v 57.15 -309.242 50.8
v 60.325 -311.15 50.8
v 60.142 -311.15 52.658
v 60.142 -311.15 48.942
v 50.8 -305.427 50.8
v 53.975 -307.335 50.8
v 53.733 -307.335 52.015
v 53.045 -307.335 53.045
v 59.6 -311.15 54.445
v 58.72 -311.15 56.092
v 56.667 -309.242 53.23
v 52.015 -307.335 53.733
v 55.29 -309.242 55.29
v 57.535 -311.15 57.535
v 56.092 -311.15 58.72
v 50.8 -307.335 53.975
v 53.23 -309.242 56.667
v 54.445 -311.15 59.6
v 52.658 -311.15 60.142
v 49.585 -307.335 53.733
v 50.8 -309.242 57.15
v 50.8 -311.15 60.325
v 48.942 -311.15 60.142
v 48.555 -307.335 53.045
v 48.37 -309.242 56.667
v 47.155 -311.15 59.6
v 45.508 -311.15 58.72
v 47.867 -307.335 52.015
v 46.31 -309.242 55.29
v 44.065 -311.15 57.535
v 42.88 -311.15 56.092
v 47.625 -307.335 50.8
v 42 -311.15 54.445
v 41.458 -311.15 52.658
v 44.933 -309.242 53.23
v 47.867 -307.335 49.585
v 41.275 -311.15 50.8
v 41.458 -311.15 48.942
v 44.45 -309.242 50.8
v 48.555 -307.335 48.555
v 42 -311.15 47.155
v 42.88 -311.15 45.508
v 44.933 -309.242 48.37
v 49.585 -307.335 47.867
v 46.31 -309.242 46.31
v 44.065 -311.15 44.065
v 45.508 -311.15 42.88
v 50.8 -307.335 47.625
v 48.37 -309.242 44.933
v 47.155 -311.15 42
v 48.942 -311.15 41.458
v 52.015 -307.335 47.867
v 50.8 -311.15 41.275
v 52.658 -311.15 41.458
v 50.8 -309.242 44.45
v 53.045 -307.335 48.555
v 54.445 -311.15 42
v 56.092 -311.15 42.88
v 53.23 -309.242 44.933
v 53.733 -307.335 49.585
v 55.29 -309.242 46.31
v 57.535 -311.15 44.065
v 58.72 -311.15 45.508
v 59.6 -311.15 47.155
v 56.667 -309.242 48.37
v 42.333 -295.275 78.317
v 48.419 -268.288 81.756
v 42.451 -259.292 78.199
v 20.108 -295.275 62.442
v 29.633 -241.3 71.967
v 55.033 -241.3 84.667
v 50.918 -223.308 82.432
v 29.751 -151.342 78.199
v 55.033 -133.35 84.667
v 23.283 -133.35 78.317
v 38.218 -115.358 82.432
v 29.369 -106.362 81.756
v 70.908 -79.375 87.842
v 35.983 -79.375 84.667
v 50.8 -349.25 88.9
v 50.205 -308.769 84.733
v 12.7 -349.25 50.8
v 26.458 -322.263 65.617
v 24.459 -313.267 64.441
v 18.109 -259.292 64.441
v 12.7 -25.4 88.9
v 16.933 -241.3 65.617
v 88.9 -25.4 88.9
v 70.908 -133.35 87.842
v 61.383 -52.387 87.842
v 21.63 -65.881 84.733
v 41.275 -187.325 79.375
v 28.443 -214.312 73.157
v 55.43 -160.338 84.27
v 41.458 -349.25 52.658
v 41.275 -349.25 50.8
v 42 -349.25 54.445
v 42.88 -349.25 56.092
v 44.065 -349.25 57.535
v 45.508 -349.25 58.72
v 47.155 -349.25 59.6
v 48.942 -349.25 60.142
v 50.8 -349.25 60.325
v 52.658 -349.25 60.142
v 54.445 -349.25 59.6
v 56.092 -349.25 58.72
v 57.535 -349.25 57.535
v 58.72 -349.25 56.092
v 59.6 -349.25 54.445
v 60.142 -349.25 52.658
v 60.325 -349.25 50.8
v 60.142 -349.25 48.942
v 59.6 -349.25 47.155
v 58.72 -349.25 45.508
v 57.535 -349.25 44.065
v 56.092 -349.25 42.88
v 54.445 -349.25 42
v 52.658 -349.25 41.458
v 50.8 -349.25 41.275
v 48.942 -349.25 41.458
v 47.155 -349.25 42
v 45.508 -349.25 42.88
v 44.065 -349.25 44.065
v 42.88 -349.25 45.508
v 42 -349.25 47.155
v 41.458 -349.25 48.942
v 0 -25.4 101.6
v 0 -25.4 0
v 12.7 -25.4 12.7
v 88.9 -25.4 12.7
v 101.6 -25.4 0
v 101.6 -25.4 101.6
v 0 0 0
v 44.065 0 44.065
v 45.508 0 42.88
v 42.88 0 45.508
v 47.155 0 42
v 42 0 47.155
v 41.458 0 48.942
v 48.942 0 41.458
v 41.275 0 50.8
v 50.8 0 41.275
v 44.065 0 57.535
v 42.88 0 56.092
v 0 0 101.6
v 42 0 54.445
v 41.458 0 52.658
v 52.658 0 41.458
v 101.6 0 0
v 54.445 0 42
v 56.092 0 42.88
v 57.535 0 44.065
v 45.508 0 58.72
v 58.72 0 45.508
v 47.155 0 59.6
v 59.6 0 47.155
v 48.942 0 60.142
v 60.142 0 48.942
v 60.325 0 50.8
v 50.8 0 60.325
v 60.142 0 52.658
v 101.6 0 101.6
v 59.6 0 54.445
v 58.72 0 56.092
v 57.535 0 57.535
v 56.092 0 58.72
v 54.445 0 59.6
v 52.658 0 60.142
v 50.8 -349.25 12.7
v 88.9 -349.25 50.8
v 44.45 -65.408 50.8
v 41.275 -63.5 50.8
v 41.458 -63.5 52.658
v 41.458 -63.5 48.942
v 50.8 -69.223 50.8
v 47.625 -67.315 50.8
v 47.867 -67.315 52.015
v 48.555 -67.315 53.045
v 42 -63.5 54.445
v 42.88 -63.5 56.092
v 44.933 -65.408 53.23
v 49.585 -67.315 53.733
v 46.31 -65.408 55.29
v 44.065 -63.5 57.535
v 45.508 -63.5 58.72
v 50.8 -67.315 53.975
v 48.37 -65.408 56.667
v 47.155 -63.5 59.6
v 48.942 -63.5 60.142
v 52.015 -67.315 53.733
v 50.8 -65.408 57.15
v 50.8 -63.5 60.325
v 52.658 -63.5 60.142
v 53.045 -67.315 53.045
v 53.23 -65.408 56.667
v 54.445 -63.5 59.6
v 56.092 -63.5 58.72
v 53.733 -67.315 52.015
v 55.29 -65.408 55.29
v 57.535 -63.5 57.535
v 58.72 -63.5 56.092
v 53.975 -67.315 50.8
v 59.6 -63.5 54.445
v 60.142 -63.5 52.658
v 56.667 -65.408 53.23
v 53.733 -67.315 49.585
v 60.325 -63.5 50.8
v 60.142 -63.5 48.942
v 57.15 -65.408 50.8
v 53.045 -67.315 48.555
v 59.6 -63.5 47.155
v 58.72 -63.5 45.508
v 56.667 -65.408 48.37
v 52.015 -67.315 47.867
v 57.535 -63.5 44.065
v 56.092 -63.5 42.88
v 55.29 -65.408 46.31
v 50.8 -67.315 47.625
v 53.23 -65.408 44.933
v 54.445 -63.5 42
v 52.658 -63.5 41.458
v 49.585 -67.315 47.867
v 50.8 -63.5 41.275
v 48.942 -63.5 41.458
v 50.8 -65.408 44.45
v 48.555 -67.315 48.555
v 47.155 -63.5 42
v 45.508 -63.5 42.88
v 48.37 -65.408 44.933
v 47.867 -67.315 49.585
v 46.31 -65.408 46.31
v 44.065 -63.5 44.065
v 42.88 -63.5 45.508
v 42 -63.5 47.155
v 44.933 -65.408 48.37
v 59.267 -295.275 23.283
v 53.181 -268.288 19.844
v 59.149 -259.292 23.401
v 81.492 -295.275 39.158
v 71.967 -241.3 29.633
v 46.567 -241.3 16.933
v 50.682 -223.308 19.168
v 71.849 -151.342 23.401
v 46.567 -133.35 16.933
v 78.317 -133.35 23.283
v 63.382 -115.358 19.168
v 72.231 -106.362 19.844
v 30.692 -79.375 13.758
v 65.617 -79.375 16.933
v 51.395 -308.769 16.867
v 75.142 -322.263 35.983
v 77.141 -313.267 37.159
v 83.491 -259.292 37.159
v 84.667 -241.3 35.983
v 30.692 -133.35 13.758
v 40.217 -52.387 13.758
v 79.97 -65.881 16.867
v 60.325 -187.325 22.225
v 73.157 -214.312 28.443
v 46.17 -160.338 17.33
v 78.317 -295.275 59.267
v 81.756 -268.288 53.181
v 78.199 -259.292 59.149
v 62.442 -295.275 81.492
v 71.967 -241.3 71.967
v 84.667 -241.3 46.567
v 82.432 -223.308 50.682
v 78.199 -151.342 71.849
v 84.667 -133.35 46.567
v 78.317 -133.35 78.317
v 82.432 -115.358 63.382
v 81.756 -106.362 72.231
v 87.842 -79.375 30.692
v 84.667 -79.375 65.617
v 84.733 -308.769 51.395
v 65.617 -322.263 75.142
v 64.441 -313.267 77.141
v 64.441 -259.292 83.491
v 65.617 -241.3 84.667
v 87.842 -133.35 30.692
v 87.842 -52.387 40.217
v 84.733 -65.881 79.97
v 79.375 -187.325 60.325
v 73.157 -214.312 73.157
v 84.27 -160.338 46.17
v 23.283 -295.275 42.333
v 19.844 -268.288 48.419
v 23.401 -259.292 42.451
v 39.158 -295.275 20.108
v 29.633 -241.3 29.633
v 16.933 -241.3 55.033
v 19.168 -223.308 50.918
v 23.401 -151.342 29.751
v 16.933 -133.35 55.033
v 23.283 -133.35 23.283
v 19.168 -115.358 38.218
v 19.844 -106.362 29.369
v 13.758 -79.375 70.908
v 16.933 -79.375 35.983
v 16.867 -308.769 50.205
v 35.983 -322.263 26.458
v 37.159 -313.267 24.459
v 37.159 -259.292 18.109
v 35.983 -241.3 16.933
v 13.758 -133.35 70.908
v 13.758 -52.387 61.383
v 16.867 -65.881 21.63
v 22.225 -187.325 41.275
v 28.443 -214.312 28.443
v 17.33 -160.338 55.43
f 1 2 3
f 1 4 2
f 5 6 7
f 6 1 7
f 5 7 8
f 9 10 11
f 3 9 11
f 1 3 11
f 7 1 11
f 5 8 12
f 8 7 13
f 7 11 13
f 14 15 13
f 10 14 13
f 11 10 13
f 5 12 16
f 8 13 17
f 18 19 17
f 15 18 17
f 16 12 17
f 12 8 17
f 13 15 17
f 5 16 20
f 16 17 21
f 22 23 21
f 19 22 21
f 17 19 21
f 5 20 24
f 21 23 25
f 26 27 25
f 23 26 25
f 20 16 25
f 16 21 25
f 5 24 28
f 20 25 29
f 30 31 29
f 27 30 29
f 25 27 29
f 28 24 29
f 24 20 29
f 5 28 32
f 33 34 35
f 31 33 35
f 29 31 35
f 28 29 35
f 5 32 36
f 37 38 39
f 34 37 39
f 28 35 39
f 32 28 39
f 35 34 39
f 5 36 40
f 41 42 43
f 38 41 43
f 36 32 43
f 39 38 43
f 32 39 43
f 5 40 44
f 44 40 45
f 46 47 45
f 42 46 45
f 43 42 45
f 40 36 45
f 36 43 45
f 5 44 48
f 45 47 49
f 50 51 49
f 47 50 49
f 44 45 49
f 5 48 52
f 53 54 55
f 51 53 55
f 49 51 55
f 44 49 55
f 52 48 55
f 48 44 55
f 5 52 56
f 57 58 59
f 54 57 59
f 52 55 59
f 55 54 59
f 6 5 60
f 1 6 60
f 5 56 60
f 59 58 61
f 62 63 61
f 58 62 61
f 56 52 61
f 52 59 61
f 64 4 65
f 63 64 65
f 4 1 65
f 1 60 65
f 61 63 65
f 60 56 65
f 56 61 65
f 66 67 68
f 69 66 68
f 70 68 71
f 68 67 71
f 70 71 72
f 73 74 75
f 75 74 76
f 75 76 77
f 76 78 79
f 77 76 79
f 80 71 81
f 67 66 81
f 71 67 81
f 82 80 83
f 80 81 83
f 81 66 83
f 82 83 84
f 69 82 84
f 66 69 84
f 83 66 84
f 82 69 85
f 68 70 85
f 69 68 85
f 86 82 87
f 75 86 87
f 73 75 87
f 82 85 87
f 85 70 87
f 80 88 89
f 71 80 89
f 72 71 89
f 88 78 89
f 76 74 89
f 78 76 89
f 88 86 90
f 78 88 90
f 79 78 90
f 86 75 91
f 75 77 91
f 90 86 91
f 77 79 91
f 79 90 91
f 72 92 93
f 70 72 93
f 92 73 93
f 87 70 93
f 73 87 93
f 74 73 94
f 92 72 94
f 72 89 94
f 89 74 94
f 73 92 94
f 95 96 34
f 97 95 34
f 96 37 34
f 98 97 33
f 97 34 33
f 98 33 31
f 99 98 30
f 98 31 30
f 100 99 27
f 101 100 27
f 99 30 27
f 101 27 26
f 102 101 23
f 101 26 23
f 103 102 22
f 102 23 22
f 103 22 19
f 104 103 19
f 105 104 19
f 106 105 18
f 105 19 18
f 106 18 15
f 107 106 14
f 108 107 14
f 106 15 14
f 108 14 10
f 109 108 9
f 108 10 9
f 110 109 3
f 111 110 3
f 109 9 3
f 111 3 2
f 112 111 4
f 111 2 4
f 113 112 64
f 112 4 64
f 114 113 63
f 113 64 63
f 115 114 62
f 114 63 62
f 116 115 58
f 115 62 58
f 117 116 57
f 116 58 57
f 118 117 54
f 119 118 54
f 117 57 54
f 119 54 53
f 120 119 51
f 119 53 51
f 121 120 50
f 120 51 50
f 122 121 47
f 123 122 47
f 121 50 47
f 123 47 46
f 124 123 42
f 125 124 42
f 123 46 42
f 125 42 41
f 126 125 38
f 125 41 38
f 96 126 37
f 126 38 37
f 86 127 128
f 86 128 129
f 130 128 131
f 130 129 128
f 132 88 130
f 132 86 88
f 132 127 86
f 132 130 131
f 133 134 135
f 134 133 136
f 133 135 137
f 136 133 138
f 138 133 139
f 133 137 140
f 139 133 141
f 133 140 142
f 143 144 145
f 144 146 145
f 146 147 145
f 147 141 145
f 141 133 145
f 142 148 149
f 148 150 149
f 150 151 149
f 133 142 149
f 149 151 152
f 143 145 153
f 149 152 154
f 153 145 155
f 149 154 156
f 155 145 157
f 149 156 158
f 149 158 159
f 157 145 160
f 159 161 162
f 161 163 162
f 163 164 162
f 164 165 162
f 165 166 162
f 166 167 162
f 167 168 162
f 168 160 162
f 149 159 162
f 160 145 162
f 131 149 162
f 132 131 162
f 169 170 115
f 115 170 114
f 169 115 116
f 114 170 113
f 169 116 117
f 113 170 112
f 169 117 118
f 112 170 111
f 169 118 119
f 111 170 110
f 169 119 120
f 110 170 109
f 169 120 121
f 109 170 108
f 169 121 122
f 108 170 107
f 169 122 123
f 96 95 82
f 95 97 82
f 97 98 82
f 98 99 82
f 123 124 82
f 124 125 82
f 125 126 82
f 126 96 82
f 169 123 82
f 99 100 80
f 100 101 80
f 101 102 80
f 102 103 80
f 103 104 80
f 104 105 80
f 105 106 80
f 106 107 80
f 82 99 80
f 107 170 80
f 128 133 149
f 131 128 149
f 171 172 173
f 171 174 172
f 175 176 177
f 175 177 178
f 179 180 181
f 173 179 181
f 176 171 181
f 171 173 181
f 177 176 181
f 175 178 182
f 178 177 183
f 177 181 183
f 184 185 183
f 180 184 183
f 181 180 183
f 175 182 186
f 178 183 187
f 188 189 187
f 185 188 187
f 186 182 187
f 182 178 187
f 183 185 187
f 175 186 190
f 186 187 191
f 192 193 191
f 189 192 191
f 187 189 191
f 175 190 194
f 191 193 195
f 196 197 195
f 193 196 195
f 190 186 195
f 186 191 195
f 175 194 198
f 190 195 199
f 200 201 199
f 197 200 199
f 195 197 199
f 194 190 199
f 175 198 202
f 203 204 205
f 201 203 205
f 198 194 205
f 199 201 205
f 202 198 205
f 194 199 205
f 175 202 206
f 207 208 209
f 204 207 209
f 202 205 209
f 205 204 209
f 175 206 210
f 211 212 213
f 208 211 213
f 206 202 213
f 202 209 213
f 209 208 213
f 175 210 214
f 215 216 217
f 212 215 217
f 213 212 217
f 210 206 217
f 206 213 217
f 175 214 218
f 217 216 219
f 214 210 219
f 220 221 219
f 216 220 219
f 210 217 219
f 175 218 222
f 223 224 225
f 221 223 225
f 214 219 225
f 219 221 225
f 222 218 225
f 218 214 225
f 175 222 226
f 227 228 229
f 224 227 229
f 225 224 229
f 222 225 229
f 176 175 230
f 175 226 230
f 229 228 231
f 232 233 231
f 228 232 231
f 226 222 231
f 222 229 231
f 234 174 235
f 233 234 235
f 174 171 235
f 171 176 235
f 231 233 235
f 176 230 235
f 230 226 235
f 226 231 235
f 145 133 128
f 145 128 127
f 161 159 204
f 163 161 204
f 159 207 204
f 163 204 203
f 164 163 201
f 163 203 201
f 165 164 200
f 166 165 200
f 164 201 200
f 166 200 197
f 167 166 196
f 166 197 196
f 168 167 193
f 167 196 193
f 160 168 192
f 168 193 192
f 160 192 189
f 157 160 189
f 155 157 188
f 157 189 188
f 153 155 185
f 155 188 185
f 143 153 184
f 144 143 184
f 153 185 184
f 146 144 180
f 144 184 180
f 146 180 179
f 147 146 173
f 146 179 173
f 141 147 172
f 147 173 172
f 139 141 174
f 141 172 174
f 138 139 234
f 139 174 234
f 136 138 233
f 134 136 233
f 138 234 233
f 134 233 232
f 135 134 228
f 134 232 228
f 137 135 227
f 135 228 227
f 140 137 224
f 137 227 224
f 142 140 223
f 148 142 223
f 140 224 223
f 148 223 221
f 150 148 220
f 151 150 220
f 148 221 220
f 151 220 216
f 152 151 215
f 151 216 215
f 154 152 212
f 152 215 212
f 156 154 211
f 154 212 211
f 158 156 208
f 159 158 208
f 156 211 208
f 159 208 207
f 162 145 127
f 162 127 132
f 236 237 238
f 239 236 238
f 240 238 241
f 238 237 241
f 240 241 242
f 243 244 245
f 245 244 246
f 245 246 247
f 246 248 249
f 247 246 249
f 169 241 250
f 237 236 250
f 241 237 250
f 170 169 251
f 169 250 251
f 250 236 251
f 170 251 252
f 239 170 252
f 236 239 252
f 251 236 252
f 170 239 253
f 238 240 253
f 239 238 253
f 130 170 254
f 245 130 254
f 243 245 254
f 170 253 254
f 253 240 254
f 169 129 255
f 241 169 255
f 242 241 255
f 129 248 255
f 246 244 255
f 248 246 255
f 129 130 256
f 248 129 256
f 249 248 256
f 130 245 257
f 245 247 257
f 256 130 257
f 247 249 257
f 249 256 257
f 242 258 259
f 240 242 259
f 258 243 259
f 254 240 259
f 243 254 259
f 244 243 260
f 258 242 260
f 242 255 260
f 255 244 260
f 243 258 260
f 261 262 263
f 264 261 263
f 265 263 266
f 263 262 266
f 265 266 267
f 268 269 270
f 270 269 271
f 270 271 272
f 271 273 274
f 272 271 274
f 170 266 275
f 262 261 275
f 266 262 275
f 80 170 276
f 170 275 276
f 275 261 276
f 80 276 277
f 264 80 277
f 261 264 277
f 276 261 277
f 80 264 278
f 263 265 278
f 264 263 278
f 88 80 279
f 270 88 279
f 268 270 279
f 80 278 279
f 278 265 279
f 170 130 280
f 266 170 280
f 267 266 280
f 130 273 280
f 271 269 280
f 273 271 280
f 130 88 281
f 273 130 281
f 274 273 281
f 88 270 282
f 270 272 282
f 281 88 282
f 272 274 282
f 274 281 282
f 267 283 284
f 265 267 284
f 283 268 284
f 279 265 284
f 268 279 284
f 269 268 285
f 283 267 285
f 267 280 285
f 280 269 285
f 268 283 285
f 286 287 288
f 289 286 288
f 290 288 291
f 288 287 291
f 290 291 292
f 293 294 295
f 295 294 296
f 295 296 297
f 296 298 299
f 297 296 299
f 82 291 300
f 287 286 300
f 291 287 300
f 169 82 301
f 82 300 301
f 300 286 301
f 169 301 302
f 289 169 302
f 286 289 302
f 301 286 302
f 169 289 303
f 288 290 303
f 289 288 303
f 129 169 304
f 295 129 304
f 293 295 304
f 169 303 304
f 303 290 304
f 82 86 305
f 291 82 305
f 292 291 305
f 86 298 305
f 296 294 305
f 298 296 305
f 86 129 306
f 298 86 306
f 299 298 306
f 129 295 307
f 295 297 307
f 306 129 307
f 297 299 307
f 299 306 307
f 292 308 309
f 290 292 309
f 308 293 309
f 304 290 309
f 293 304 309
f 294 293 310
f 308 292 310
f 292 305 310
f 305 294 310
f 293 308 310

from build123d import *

# Parameters (mm, degrees)
F0_W     = 101.6
F0_H     = 101.6
F1_DEPTH = 25.4
F4_W     = 76.2
F4_H     = 76.2
F7_D     = 19.05
F7_DEPTH = 63.5
F7_TIP   = 5.7231973962
F9_D     = 19.05
F9_DEPTH = 38.1
F9_TIP   = 5.7231973962


with BuildPart() as f1:
    # F0 (on Front) → F1 (new body)
    with BuildSketch(Plane.XZ):
        with Locations((50.8, 50.8)):
            Rectangle(F0_W, F0_H)
    extrude(amount=F1_DEPTH)

    # F3 (on offset) → F5 section 0
    with BuildSketch(Plane.XZ.offset(349.25)):
        Polygon((88.9, 50.8), (50.8, 88.9), (12.7, 50.8), (50.8, 12.7), align=None)
    # F4 (on face) → F5 section 1
    with BuildSketch(Plane.XZ.offset(25.4)):
        with Locations((50.8, 50.8)):
            Rectangle(F4_W, F4_H)
    loft()

    # F7
    with Locations(Plane(origin=(0, 0, 0), x_dir=(-1, 0, 0), z_dir=(0, 1, 0))):
        with Locations((-50.8, 50.8)):
            Hole(F7_D / 2, depth=F7_DEPTH)
            with Locations((0, 0, -(F7_DEPTH + F7_TIP / 2))):  # 118° drill point
                Cone(0, F7_D / 2, F7_TIP, mode=Mode.SUBTRACT)

    # F9
    with Locations(Plane.XZ.offset(349.25)):
        with Locations((50.8, 50.8)):
            Hole(F9_D / 2, depth=F9_DEPTH)
            with Locations((0, 0, -(F9_DEPTH + F9_TIP / 2))):  # 118° drill point
                Cone(0, F9_D / 2, F9_TIP, mode=Mode.SUBTRACT)


solid = f1.part
